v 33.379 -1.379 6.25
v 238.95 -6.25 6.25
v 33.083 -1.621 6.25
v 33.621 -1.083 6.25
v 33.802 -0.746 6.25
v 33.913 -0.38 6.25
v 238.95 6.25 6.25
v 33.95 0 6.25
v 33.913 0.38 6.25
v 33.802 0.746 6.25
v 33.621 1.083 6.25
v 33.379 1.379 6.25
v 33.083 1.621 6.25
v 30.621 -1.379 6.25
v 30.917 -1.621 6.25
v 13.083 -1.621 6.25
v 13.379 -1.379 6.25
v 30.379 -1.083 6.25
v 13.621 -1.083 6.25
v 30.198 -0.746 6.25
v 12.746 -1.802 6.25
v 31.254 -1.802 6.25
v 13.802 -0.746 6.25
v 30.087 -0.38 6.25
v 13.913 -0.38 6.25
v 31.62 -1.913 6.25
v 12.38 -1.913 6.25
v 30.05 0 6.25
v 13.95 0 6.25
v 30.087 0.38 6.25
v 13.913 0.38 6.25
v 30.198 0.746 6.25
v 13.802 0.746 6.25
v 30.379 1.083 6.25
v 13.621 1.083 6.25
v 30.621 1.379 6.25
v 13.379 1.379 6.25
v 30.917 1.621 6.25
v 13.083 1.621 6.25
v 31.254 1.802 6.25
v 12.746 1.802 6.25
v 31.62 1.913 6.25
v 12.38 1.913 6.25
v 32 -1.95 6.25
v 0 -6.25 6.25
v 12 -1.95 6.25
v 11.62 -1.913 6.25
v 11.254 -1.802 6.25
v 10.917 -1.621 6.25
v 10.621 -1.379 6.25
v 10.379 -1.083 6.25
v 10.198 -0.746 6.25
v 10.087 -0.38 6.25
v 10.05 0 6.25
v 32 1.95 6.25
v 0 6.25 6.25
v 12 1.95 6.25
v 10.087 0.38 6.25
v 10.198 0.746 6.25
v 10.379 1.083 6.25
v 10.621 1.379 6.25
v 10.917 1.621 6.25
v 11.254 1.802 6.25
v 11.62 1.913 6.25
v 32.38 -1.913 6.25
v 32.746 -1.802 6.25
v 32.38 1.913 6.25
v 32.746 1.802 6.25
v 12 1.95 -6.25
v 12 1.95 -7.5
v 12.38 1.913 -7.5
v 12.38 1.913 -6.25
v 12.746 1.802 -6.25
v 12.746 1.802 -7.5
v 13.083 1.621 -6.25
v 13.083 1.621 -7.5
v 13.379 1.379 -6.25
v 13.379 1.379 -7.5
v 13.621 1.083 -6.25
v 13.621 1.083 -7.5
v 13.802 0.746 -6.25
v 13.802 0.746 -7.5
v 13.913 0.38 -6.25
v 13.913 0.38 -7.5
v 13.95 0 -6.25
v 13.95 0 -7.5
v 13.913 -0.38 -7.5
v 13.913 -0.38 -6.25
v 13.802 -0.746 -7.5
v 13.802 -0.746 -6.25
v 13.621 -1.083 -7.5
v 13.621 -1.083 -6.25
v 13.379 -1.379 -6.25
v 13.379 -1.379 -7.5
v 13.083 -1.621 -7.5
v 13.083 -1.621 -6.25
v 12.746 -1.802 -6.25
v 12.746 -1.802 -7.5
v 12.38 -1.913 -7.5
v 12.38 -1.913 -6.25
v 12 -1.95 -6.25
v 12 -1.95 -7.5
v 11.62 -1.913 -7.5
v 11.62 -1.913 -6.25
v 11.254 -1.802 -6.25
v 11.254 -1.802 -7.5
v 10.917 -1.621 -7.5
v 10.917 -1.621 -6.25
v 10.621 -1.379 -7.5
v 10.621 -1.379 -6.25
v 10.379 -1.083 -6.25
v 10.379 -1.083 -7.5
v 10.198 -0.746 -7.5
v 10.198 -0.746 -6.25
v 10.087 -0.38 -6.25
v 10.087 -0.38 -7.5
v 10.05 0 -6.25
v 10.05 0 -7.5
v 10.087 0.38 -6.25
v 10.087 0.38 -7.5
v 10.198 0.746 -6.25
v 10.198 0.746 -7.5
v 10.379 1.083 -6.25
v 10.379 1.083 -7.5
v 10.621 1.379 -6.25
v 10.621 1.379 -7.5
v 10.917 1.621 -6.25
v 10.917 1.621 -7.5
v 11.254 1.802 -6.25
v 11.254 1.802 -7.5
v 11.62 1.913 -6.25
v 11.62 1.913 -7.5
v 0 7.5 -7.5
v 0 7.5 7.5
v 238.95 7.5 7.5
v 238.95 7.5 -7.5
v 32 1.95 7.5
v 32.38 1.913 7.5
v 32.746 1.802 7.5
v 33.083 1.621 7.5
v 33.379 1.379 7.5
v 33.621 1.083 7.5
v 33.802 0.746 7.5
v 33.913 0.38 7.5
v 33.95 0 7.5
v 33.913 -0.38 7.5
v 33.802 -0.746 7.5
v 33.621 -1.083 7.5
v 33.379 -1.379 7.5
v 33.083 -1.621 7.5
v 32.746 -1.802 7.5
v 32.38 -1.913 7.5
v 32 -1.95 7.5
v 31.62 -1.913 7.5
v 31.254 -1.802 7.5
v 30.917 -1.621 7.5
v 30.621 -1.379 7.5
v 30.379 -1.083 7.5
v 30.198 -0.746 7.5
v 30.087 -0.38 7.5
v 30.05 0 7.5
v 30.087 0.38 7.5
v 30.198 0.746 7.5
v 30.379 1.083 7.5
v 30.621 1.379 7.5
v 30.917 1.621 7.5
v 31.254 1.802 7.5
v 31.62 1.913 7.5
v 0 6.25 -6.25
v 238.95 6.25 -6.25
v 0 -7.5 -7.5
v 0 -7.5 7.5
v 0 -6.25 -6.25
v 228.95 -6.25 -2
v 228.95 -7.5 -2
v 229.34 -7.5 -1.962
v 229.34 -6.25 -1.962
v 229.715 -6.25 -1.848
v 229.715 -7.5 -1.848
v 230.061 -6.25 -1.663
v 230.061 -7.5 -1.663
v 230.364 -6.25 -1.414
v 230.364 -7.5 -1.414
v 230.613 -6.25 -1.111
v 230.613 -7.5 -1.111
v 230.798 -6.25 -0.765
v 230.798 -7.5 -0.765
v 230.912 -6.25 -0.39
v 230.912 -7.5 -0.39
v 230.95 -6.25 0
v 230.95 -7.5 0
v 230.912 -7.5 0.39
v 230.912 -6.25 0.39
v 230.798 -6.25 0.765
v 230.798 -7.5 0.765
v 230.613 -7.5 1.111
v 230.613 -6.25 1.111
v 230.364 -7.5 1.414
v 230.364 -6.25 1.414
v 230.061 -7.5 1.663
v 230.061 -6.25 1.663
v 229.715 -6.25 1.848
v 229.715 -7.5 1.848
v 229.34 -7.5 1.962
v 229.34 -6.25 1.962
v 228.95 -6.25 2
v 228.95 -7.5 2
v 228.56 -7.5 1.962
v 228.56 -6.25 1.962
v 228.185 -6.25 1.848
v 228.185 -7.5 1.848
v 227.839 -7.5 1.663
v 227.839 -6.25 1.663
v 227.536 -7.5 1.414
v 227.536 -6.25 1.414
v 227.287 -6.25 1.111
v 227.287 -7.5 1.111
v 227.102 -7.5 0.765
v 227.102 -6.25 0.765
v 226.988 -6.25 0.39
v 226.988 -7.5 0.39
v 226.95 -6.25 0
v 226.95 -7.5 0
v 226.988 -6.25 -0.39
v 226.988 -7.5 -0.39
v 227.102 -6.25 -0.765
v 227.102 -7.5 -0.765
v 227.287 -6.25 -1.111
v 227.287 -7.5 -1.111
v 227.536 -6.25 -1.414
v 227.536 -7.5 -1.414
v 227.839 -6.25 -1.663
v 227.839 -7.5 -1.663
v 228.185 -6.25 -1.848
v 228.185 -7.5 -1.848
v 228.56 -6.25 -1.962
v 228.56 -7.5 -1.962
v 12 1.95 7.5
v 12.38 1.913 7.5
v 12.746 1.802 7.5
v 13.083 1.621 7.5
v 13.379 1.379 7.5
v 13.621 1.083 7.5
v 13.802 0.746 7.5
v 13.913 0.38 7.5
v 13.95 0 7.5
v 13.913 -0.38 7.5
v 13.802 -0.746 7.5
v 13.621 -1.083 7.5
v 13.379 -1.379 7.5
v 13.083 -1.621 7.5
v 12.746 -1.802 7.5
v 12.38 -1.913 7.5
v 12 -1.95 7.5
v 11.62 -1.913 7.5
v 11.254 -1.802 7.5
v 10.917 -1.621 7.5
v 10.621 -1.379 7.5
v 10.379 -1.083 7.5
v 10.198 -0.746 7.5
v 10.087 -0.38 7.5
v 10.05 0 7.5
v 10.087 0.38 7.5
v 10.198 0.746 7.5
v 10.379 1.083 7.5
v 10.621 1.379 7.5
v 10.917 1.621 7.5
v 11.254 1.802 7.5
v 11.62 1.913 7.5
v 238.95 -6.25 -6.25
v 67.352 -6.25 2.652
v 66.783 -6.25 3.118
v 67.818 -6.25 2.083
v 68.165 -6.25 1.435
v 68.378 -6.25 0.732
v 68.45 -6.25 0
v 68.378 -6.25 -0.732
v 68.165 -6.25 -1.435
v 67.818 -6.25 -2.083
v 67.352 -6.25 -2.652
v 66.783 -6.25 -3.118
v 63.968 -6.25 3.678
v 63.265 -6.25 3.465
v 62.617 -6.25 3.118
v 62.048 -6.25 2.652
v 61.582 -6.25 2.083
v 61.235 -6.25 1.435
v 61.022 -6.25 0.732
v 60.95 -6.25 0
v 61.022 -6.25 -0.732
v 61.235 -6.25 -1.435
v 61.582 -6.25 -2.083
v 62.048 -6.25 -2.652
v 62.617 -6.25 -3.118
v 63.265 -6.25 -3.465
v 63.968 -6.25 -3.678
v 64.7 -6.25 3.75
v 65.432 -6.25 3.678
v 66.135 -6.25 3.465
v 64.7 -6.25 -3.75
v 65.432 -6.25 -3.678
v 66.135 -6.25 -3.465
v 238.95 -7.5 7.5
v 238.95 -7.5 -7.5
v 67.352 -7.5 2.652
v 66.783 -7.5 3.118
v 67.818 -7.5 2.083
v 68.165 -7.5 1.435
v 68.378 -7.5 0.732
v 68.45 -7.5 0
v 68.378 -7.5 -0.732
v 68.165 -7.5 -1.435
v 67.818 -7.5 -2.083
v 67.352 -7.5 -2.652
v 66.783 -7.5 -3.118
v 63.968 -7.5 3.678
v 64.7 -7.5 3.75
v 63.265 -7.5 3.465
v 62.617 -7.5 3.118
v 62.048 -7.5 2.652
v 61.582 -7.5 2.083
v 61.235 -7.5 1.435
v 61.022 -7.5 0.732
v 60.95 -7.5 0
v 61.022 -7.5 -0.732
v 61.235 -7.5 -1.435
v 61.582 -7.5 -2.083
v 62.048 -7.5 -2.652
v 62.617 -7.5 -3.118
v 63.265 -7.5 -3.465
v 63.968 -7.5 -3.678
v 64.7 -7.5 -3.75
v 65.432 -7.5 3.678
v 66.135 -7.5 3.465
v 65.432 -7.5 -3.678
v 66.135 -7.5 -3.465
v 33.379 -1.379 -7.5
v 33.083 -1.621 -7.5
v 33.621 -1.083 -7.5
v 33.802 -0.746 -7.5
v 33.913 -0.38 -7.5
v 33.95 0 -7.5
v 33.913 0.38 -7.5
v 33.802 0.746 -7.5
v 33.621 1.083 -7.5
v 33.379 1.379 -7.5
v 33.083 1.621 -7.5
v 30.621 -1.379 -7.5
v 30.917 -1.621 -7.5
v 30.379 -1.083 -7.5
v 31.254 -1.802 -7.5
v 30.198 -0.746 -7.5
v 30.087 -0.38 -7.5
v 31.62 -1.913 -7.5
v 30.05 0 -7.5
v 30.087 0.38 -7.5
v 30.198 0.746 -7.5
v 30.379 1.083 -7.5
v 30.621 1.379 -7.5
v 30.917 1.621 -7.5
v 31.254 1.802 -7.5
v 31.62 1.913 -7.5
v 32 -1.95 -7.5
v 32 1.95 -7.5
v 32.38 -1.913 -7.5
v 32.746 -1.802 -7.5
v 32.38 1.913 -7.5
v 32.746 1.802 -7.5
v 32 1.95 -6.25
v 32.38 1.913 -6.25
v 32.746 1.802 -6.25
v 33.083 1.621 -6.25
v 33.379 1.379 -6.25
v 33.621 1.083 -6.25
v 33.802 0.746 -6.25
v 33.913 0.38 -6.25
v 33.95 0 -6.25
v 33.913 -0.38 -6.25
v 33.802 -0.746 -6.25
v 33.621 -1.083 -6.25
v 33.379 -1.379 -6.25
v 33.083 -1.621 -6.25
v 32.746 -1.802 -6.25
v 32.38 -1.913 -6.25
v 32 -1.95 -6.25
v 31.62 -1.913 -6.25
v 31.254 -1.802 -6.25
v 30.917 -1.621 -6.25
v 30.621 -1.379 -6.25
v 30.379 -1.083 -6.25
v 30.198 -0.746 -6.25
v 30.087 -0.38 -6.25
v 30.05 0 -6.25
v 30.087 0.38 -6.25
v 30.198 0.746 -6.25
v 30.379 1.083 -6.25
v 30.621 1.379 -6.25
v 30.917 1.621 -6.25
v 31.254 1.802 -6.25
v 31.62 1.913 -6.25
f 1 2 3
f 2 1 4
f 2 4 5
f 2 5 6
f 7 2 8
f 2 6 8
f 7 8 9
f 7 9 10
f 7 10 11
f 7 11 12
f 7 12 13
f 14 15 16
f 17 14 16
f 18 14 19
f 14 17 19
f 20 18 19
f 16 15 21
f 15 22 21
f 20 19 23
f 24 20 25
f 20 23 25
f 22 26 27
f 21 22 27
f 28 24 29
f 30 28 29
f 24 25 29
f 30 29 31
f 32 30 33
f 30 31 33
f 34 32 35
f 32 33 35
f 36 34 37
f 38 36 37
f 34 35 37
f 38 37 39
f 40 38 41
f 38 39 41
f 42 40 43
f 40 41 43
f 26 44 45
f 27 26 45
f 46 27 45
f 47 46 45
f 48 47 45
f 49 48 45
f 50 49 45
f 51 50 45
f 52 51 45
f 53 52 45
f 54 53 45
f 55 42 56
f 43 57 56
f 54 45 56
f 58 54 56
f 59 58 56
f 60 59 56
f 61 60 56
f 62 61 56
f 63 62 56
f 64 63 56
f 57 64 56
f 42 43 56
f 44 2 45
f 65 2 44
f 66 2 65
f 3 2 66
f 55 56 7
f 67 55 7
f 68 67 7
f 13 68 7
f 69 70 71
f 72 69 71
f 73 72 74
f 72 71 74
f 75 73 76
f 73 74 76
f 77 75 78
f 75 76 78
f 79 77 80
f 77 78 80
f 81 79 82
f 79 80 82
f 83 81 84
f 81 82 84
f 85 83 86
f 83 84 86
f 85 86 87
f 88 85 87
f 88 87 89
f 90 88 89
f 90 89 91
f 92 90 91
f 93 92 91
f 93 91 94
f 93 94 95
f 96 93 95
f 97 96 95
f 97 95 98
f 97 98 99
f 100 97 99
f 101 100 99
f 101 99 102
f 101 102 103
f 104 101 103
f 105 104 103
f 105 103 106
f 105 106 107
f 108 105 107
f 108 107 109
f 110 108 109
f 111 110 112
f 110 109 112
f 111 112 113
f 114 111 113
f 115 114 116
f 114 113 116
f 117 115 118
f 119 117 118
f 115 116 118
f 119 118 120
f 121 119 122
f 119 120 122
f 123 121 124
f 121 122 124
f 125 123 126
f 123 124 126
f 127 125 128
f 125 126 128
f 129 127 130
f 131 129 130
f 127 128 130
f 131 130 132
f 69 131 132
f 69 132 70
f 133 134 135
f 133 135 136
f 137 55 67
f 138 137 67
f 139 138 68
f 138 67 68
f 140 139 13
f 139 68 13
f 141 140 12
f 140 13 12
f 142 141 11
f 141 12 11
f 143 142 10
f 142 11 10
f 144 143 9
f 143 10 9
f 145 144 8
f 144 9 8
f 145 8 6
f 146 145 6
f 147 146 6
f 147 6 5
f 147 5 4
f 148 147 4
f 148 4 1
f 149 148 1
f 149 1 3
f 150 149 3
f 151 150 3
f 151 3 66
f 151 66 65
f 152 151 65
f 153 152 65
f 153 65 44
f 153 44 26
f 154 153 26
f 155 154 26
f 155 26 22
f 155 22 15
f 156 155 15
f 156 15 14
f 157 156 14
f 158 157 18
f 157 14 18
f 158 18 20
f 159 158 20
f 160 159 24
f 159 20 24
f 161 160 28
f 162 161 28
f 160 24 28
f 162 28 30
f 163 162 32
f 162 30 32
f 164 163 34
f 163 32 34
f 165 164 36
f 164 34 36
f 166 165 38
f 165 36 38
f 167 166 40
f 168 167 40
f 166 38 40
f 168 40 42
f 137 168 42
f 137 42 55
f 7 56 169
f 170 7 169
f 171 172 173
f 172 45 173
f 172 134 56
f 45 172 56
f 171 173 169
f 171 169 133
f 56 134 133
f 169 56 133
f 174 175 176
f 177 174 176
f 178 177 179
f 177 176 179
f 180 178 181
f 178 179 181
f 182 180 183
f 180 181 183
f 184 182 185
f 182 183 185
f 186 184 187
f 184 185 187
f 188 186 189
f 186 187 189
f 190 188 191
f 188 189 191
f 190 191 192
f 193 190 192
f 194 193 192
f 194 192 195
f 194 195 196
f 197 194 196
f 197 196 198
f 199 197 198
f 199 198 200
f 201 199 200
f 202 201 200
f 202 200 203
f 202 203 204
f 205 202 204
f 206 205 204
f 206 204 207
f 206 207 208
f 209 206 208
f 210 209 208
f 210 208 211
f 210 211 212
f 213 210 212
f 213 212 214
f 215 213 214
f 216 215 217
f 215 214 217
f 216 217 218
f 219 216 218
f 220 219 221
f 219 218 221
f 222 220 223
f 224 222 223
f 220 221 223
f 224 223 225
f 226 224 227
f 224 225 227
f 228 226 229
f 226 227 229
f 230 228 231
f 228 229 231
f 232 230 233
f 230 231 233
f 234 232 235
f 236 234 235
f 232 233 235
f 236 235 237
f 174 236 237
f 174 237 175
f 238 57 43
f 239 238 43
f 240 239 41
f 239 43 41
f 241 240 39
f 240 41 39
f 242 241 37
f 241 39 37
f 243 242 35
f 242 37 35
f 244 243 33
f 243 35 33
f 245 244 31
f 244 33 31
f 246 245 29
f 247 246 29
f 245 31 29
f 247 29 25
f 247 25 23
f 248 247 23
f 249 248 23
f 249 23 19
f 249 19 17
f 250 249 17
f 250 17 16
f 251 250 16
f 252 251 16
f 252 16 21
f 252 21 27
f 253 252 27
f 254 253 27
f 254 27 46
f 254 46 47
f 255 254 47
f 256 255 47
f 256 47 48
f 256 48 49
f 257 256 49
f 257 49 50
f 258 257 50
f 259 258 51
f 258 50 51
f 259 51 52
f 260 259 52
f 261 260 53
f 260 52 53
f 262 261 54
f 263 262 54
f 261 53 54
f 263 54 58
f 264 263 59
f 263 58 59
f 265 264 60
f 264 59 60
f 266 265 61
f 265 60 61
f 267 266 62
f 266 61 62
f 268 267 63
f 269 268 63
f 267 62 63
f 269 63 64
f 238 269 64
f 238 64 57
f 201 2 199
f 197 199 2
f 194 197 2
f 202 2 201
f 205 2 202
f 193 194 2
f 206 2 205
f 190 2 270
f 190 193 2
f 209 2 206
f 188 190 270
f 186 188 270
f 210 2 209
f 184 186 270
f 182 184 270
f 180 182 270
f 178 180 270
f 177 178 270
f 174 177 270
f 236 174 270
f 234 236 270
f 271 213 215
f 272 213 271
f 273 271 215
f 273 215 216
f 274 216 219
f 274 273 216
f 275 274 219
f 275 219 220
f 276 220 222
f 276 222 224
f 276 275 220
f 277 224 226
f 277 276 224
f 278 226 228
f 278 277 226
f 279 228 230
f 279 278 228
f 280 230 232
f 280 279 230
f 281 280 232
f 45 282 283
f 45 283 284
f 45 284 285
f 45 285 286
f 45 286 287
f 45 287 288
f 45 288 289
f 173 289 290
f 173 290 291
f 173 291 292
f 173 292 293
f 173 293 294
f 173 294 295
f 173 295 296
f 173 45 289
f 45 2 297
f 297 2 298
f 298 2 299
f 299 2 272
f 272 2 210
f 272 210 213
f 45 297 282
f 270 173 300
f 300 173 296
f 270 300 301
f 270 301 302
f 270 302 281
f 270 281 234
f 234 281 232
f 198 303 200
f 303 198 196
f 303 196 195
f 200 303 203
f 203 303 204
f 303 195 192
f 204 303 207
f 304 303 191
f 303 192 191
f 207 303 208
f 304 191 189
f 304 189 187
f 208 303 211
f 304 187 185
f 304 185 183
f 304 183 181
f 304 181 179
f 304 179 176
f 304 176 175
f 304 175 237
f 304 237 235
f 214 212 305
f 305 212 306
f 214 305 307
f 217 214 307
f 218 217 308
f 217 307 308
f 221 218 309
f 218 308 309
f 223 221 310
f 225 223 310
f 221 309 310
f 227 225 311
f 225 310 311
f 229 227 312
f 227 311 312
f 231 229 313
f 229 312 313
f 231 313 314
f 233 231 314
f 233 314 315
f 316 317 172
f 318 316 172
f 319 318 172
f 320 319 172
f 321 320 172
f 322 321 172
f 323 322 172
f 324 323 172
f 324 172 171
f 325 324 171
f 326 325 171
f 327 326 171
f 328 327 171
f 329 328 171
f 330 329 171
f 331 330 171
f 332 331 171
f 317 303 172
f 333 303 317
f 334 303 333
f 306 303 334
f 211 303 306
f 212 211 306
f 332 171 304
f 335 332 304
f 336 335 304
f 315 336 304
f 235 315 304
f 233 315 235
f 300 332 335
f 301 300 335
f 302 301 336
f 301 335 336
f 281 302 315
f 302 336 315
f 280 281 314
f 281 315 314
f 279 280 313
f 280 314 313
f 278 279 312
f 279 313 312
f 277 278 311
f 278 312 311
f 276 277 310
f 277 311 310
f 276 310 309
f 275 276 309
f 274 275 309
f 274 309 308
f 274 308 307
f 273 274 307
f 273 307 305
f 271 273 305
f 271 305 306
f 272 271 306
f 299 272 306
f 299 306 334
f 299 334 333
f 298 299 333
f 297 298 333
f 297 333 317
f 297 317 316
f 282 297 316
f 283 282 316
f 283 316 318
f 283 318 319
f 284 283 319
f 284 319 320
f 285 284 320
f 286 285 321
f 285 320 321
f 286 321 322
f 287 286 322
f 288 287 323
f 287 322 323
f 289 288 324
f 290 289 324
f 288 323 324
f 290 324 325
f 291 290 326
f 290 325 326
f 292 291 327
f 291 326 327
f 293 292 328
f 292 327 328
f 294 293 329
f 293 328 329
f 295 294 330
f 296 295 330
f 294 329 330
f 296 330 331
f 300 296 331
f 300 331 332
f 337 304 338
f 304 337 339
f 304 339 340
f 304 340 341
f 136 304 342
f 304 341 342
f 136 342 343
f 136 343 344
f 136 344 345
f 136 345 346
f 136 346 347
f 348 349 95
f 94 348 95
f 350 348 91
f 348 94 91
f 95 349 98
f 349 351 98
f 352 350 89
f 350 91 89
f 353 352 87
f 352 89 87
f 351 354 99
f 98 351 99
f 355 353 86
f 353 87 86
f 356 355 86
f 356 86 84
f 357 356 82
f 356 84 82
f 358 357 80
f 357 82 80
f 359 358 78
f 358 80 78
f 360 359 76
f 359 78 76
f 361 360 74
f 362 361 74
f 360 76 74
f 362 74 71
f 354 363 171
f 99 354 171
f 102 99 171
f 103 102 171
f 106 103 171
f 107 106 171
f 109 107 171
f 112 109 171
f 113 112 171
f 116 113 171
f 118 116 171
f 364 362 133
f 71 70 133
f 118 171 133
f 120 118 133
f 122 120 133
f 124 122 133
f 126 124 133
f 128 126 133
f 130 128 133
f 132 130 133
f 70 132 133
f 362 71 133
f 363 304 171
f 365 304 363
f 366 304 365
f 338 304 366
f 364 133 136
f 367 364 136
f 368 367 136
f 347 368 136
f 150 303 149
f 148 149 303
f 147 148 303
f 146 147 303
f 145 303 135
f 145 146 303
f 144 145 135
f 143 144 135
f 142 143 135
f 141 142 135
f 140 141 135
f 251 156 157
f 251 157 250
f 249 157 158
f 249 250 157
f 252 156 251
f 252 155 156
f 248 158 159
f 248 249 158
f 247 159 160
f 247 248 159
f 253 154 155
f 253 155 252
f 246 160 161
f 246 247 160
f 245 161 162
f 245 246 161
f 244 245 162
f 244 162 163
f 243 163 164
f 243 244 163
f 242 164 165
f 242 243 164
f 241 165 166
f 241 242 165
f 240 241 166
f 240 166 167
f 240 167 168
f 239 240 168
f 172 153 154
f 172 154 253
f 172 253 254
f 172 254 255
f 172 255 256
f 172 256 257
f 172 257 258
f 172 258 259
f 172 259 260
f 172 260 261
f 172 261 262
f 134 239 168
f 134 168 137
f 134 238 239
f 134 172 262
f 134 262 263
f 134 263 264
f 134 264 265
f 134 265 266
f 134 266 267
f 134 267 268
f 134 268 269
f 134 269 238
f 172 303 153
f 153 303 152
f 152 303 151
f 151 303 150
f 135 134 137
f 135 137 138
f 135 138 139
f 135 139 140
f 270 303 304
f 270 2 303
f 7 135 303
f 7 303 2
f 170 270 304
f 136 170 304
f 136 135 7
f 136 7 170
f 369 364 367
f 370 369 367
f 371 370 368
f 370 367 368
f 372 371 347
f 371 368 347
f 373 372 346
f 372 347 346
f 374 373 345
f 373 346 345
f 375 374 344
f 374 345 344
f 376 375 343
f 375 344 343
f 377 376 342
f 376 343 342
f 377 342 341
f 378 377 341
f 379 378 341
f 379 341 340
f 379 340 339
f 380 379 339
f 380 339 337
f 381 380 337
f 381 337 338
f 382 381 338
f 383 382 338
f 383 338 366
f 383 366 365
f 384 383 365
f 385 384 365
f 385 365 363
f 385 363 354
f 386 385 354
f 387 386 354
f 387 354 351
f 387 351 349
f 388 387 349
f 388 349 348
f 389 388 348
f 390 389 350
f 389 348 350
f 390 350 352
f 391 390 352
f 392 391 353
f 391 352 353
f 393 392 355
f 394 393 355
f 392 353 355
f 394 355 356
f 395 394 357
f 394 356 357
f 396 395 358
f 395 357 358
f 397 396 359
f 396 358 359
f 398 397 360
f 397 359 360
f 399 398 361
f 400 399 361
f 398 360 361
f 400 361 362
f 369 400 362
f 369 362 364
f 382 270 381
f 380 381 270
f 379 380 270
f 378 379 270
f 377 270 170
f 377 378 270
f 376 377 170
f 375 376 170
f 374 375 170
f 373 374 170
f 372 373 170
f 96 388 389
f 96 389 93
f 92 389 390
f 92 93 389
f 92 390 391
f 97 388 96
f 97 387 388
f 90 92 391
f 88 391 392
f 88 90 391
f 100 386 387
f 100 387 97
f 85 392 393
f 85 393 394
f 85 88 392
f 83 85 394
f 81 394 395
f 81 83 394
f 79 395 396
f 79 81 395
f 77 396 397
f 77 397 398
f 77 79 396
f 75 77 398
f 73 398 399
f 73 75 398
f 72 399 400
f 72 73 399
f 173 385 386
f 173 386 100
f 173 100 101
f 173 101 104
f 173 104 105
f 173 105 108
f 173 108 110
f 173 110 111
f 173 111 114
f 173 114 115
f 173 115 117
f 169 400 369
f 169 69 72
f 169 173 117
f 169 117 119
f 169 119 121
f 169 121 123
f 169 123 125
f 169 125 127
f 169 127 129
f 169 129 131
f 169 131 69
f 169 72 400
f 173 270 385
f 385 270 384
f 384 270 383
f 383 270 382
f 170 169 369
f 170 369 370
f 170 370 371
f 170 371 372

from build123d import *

# Parameters (mm, degrees)
SKETCH1_W           = 15
SKETCH1_H           = 15
SKETCH1_W_2         = 12.5
SKETCH1_H_2         = 12.5
BOSS_EXTRUDE1_DEPTH = 238.95
SKETCH2_R           = 1.95
CUT_EXTRUDE1_DEPTH  = 240.537789294
SKETCH5_R           = 3.75
SKETCH5_R_2         = 2
CUT_EXTRUDE6_DEPTH  = 5


with BuildPart() as part:
    # Sketch1 → Boss-Extrude1 (new body)
    with BuildSketch(Plane(origin=(0, 0, 0), x_dir=(0, 0, -1), z_dir=(1, 0, 0))):
        Rectangle(SKETCH1_W, SKETCH1_H)
        Rectangle(SKETCH1_W_2, SKETCH1_H_2, mode=Mode.SUBTRACT)
    extrude(amount=BOSS_EXTRUDE1_DEPTH)

    # Sketch2 → Cut-Extrude1 (cut, through all)
    with BuildSketch(Plane(origin=(0, 0, -7.5), x_dir=(-1, 0, 0), z_dir=(0, 0, -1))):
        with Locations(Location((-12.000000001, 0, 0), (0, 0, 90))):
            Circle(SKETCH2_R)
        with Locations(Location((-32.000000001, 0, 0), (0, 0, 90))):
            Circle(SKETCH2_R)
    extrude(amount=-CUT_EXTRUDE1_DEPTH, mode=Mode.SUBTRACT)

    # Sketch5 → Cut-Extrude6 (cut)
    with BuildSketch(Plane.XZ.offset(7.5)):
        with Locations(Location((64.7, 0, 0), (0, 0, 270))):
            Circle(SKETCH5_R)
        with Locations(Location((228.95, 0, 0), (0, 0, 270))):
            Circle(SKETCH5_R_2)
    extrude(amount=-CUT_EXTRUDE6_DEPTH, mode=Mode.SUBTRACT)


solid = part.part
